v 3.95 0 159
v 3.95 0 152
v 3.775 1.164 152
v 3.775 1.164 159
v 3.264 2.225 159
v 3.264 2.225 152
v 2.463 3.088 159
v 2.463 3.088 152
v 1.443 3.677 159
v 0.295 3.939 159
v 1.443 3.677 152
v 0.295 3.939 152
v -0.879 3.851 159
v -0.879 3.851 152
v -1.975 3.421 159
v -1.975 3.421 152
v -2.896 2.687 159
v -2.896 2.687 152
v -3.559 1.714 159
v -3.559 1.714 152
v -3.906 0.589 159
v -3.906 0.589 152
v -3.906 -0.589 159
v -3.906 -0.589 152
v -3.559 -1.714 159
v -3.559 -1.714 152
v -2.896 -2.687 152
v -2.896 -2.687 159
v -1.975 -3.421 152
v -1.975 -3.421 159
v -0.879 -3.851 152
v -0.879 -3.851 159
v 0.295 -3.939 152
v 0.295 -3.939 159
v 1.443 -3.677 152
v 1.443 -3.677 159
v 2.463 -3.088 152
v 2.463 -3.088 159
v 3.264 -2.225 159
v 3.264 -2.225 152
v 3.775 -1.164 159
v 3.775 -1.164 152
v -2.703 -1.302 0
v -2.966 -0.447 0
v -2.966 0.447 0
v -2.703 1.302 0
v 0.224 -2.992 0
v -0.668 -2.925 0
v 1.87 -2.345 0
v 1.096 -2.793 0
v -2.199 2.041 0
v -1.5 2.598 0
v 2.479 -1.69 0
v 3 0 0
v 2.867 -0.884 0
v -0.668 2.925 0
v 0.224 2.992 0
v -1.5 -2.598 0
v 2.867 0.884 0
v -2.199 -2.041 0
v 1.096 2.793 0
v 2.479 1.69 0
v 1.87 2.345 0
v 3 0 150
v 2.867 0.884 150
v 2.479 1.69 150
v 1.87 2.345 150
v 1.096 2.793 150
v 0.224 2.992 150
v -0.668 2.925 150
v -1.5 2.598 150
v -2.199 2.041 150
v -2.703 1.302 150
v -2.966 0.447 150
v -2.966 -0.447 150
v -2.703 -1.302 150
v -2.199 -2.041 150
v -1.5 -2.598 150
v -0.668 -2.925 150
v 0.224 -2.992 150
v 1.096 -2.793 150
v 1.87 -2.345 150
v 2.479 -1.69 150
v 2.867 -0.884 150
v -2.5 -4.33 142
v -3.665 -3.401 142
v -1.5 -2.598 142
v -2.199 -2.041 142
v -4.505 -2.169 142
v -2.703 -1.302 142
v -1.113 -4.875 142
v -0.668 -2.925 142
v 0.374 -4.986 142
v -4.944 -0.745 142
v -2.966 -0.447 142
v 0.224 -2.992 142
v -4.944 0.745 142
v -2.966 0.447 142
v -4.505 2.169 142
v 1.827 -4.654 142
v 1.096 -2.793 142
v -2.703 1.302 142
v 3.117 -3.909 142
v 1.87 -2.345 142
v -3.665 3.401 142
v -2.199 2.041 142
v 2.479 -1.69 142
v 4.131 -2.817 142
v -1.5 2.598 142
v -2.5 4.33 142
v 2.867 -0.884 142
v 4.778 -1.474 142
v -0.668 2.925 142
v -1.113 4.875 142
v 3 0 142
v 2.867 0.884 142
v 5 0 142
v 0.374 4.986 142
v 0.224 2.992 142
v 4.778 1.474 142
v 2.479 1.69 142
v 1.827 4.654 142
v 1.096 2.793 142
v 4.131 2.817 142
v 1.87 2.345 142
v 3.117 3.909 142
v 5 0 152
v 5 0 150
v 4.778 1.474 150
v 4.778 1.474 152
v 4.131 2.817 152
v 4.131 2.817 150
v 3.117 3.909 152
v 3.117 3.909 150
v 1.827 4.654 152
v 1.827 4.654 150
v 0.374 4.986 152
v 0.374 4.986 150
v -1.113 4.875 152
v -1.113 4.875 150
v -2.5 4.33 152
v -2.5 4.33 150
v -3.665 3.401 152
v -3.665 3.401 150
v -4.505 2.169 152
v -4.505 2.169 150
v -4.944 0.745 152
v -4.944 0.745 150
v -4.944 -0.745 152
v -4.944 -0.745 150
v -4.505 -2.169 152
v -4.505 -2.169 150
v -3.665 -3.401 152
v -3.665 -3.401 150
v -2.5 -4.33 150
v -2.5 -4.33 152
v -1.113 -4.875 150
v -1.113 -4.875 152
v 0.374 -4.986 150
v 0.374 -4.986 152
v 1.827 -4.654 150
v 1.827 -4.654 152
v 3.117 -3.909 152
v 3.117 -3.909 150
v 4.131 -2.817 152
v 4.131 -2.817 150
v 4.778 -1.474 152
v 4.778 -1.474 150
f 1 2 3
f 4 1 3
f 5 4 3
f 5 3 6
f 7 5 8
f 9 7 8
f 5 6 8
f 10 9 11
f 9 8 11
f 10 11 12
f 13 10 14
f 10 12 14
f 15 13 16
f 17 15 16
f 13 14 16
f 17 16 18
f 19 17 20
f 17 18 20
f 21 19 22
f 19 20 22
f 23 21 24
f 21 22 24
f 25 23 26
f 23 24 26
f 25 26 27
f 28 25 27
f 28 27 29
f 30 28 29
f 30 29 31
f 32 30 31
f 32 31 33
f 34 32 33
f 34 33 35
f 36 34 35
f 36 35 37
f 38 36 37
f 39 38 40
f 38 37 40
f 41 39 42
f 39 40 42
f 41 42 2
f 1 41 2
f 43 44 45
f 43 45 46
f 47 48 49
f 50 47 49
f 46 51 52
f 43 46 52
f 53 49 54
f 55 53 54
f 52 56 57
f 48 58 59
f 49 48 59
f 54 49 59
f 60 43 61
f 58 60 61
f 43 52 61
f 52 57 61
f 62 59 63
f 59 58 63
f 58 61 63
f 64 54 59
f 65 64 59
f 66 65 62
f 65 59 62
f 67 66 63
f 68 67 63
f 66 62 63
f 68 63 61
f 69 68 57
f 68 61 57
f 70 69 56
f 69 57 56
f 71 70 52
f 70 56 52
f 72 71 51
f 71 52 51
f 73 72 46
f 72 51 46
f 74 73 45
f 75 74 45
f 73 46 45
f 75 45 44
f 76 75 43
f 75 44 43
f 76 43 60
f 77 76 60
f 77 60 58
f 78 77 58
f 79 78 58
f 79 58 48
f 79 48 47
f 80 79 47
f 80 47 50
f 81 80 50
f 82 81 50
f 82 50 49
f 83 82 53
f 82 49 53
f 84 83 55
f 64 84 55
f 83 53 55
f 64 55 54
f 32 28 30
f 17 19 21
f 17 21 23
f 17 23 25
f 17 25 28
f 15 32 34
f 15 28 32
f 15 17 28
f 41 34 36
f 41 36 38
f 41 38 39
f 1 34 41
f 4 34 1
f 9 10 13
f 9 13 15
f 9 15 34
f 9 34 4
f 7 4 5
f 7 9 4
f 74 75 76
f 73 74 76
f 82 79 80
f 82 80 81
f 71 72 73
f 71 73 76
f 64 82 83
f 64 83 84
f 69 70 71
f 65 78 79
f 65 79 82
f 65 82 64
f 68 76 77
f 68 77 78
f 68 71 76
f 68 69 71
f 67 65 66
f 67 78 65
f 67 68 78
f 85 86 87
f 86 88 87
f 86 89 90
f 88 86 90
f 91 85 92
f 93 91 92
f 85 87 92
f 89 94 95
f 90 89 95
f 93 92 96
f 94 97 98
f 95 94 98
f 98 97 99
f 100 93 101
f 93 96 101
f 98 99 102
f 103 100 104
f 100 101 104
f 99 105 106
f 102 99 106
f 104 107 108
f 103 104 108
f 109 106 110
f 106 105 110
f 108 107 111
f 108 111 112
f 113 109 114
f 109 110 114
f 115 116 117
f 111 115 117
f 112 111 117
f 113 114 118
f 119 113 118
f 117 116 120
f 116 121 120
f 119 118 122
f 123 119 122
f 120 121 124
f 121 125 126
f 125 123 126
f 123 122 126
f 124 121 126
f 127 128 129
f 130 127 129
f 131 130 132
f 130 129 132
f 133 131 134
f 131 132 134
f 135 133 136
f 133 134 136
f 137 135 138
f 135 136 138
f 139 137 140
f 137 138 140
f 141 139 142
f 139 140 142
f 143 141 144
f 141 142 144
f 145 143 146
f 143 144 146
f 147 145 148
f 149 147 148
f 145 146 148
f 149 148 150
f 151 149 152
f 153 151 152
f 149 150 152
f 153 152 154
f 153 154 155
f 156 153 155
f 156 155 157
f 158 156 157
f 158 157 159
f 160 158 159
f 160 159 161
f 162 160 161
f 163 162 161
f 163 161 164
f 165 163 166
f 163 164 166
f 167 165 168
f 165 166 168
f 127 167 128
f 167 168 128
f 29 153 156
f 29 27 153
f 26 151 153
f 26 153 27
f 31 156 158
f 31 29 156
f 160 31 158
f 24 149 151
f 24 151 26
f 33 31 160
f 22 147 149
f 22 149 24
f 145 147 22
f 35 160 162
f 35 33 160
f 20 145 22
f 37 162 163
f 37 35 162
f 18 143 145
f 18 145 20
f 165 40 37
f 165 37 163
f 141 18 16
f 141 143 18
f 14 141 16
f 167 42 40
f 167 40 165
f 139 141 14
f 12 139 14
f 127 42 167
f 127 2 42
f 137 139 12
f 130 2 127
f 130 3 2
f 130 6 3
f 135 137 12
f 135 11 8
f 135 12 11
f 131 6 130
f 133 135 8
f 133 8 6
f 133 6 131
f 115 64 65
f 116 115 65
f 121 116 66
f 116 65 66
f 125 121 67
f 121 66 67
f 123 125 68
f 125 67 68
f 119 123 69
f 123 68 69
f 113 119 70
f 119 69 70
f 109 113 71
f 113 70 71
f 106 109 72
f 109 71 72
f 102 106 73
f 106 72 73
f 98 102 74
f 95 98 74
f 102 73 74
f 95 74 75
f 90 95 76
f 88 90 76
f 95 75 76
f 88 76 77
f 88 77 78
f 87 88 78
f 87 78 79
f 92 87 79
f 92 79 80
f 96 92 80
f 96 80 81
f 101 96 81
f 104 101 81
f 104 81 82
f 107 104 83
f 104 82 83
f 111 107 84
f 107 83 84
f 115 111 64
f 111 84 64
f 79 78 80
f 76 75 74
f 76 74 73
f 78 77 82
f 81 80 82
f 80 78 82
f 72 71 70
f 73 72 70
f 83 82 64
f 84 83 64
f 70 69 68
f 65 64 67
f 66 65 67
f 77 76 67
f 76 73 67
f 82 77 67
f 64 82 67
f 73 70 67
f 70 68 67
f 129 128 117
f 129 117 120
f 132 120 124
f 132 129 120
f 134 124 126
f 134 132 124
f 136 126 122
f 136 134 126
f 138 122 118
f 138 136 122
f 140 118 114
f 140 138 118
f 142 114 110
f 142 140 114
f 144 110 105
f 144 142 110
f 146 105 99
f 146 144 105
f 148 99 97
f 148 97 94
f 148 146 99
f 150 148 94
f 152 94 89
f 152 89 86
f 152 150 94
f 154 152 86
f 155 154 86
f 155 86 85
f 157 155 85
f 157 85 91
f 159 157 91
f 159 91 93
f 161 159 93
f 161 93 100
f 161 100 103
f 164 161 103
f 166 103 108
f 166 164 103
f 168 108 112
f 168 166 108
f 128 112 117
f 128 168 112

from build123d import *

# Parameters (mm, degrees)
F0_R     = 3
F1_DEPTH = 150
F2_R     = 5
F2_R_2   = 3
F3_DEPTH = 8
F4_DEPTH = 2
F5_R     = 3.95
F6_DEPTH = 7


with BuildPart() as f1:
    # F0 (on Top) → F1 (new body)
    with BuildSketch(Plane.XY):
        Circle(F0_R)
    extrude(amount=F1_DEPTH)


with BuildPart() as f3:
    # F2 (on face) → F3 (new body)
    with BuildSketch(Plane.XY.offset(150)):
        Circle(F2_R)
        Circle(F2_R_2, mode=Mode.SUBTRACT)
    extrude(amount=-F3_DEPTH)

    # F2 (on face) → F4 (join)
    with BuildSketch(Plane.XY.offset(150)):
        Circle(F2_R)
        Circle(F2_R_2, mode=Mode.SUBTRACT)
        Circle(F2_R_2)
    extrude(amount=F4_DEPTH)

    # F5 (on face) → F6 (join)
    with BuildSketch(Plane.XY.offset(152)):
        Circle(F5_R)
    extrude(amount=F6_DEPTH)


solid = Compound([f1.part, f3.part])
